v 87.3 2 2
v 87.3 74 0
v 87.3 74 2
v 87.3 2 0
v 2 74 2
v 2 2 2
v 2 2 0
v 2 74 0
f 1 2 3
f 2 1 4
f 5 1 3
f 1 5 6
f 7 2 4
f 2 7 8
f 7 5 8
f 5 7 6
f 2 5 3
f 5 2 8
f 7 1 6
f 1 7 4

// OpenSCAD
COVER_X = 85.3;
COVER_Y = 72;
COVER_THICK = 2;
MARGIN = 1;
BOX_THICK = 2;

FN = 64;

difference () {
// base
    translate ([BOX_THICK, BOX_THICK, 0]) {
        cube ([COVER_X, COVER_Y, COVER_THICK]);
    }

    // screw holes
    translate ([0, 0, -MARGIN]) {
        linear_extrude(height = COVER_THICK + 2 * MARGIN) {
            import(file = "../drawings/camera.dxf", layer = "openscad-cover-screws", $fn=FN);
        }
    }
}
